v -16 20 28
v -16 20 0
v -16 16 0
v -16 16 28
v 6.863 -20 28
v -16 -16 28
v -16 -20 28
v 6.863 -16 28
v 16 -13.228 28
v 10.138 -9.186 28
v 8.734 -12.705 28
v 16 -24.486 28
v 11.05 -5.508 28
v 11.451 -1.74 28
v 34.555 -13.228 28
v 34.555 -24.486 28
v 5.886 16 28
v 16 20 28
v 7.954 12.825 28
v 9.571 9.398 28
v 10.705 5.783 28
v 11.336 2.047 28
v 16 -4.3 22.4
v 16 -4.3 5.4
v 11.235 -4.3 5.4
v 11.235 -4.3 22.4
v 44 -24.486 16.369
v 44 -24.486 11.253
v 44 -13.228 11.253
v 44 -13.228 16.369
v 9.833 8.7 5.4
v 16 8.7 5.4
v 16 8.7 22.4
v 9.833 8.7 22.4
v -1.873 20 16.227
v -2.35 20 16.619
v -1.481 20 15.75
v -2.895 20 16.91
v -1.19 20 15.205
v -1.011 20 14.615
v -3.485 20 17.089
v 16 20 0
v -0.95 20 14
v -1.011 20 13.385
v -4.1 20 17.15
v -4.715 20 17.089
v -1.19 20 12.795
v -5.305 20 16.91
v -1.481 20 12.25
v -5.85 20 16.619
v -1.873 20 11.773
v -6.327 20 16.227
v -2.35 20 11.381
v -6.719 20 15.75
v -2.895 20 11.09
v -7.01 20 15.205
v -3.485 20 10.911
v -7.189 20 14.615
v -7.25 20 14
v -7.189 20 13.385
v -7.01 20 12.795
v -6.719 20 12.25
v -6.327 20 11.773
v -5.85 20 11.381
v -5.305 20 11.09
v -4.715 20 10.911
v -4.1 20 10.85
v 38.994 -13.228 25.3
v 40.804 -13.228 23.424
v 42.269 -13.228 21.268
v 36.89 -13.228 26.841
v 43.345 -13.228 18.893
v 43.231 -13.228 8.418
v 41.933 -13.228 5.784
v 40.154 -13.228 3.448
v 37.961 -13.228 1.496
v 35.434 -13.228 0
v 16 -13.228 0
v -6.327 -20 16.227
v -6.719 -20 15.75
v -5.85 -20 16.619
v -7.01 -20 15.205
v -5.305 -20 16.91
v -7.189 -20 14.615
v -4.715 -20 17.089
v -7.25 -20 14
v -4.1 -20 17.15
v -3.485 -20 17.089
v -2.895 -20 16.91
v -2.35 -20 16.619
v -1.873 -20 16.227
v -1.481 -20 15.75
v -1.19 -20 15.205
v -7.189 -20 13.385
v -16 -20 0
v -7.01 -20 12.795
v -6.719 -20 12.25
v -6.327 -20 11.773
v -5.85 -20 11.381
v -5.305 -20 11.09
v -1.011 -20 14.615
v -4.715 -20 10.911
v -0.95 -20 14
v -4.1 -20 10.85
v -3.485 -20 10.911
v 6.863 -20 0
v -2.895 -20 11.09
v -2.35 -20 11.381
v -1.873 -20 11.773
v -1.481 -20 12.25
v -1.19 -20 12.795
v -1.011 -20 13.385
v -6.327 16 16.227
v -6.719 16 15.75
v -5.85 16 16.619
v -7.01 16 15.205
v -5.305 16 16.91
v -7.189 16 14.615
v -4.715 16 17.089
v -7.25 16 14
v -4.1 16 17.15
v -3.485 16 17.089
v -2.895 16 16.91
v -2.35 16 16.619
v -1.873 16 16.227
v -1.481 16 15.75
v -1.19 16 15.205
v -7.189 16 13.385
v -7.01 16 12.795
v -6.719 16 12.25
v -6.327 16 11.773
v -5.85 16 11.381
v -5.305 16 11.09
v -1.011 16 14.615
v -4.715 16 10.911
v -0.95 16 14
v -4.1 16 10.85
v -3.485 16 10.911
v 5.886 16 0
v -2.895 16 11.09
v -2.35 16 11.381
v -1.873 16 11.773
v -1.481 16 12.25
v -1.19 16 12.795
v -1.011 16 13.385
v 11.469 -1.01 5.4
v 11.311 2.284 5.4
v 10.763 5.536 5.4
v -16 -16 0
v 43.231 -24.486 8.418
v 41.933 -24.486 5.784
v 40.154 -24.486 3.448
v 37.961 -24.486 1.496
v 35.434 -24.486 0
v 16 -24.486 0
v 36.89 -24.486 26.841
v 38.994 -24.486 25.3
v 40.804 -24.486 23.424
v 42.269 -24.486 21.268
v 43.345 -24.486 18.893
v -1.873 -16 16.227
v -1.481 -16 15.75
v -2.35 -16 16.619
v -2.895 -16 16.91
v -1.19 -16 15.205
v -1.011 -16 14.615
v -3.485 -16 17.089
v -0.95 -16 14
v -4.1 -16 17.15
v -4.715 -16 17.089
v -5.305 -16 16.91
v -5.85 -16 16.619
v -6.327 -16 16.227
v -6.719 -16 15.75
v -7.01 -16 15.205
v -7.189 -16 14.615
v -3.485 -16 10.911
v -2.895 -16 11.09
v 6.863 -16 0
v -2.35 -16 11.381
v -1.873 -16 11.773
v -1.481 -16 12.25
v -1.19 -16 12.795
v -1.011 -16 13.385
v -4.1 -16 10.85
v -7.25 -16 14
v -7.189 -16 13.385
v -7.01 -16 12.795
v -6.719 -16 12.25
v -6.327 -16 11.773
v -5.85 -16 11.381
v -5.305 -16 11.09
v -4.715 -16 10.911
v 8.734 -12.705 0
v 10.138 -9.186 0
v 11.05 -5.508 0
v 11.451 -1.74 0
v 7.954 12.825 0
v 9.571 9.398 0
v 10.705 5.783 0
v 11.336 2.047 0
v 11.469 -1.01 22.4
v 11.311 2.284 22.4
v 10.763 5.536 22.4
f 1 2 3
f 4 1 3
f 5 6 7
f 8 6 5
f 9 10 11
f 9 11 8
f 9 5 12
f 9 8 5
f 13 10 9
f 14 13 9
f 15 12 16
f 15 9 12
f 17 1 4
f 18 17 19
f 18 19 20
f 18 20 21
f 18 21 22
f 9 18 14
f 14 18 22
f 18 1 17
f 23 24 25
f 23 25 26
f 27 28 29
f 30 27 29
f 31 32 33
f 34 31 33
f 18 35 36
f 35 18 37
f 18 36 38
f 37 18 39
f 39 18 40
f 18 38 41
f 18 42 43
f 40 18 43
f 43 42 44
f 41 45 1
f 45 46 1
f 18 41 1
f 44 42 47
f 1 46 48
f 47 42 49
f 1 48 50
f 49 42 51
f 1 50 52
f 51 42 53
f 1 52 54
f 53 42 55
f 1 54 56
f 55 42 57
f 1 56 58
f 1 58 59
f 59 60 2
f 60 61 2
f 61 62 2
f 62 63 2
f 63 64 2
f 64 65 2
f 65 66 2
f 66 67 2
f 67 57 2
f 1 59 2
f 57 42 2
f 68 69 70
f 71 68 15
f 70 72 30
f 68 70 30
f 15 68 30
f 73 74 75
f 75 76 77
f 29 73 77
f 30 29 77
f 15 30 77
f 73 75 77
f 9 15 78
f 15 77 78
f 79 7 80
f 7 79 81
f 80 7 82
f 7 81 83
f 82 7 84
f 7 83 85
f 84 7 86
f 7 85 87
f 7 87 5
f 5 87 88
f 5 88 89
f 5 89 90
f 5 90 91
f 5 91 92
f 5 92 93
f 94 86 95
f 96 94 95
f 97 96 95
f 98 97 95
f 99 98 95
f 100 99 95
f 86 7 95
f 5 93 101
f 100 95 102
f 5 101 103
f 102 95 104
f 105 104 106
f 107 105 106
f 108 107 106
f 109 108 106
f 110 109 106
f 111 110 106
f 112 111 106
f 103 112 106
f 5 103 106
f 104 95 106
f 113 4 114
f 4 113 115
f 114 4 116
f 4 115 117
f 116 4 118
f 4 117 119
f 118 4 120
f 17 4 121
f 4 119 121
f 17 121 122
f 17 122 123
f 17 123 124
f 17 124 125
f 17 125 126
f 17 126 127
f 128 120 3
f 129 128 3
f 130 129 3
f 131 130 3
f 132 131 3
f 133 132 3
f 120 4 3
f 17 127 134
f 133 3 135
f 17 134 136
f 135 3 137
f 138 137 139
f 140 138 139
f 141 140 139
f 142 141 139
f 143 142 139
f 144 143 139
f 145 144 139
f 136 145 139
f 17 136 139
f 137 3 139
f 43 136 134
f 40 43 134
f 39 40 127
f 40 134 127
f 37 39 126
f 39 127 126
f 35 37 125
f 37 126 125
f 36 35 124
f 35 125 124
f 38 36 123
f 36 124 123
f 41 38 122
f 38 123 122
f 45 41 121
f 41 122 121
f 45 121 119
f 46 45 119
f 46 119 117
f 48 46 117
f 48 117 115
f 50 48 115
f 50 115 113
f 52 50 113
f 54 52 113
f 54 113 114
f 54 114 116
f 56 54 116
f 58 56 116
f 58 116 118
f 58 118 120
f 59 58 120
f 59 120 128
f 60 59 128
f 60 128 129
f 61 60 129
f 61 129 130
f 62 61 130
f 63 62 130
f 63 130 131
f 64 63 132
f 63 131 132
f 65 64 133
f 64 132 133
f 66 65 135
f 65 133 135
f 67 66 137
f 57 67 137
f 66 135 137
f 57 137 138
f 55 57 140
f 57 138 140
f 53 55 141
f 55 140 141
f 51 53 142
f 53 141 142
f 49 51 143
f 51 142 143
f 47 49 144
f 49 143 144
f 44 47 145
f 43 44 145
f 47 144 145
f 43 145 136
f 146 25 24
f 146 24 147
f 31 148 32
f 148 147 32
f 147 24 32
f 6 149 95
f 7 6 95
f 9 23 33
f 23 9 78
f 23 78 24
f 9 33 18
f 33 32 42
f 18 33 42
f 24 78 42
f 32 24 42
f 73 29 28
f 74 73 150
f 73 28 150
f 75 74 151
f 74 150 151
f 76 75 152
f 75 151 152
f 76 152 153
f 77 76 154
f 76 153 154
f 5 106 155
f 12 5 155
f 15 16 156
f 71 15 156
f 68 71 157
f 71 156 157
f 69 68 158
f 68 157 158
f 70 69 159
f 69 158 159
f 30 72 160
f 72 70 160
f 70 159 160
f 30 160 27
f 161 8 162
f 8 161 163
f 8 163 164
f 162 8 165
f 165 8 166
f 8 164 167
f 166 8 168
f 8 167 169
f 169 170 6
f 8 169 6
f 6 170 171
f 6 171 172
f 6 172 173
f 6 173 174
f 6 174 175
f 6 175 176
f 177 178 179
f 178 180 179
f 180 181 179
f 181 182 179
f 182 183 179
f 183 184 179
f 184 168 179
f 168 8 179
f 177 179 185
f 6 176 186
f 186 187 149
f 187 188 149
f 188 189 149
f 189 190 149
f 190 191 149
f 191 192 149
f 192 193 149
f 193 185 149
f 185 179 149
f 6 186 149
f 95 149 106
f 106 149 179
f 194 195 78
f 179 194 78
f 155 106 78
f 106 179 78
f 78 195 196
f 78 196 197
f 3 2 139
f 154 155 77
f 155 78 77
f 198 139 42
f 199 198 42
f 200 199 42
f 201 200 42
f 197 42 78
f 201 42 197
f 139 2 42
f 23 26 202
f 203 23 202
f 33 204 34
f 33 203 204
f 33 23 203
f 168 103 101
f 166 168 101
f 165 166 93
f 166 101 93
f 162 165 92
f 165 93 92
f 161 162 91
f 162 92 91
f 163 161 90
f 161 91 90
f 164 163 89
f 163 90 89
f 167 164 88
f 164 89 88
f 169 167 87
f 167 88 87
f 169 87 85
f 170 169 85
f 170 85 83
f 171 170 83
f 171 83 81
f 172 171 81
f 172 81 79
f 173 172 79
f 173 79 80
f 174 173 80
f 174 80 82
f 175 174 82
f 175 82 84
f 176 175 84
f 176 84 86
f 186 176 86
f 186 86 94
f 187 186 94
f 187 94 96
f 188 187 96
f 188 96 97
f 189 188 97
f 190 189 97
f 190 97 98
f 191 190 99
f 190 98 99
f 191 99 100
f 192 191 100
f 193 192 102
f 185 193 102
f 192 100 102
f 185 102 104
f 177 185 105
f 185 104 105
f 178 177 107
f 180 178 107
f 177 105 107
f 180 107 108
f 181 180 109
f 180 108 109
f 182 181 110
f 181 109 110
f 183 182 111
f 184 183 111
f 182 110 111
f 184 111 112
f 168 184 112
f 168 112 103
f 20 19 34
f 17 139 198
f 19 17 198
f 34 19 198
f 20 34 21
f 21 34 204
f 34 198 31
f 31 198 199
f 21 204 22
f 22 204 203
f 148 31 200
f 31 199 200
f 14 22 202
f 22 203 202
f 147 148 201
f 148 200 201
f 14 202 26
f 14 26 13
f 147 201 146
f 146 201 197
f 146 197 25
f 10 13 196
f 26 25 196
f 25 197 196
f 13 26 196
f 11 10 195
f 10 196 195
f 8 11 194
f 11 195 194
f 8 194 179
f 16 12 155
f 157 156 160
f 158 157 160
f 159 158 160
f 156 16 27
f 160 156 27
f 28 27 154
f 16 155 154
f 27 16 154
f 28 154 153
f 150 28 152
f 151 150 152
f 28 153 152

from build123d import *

# Parameters (mm, degrees)
F1_DEPTH = 28
F2_R     = 3.15
F3_DEPTH = 40.001
F4_W     = 13
F4_H     = 17
F5_DEPTH = 32.001
F7_DEPTH = 44.4873


with BuildPart() as f1:
    # F0 (on Top) → F1 (new body)
    with BuildSketch(Plane.XY):
        with BuildLine():
            Line((16, 20), (-16, 20))
            Line((-16, 20), (-16, 16))
            Line((-16, 16), (-14, 16))
            Line((-14, 16), (5.885721, 16))
            ThreePointArc((5.885721, 16), (11.458172, 0.155277), (6.863122, -16))
            Line((6.863122, -16), (-14, -16))
            Line((-14, -16), (-16, -16))
            Line((-16, -16), (-16, -20))
            Line((-16, -20), (6.863122, -20))
            Line((6.863122, -20), (16, -24.4863))
            Line((16, -24.4863), (44, -24.4863))
            Line((44, -24.4863), (44, -20))
            Line((44, -20), (44, -13.228022))
            Line((44, -13.228022), (16, -13.228022))
            Line((16, -13.228022), (16, -10))
            Line((16, -10), (16, 20))
        make_face()
    extrude(amount=F1_DEPTH)

    # F2 (on face) → F3 (cut, through all)
    with BuildSketch(Plane.XZ.offset(20)):
        with Locations((-4.1, 14)):
            Circle(F2_R)
    extrude(amount=-F3_DEPTH, mode=Mode.SUBTRACT)

    # F4 (on face) → F5 (cut, through all)
    with BuildSketch(Plane.YZ.offset(16)):
        with Locations((2.2, 13.9)):
            Rectangle(F4_W, F4_H)
    extrude(amount=-F5_DEPTH, mode=Mode.SUBTRACT)

    # F6 (on face) → F7 (cut, through all)
    with BuildSketch(Plane.XZ.offset(24.4863)):
        with BuildLine():
            ThreePointArc((34.555264, 28), (40.804386, 23.424462), (44, 16.369312))
            Line((44, 16.369312), (44, 28))
            Line((44, 28), (34.555264, 28))
        make_face()
        with BuildLine():
            ThreePointArc((44, 11.252501), (41.099959, 4.573225), (35.433516, 0))
            Line((35.433516, 0), (44, 0))
            Line((44, 0), (44, 11.252501))
        make_face()
    extrude(amount=-F7_DEPTH, mode=Mode.SUBTRACT)


solid = f1.part
